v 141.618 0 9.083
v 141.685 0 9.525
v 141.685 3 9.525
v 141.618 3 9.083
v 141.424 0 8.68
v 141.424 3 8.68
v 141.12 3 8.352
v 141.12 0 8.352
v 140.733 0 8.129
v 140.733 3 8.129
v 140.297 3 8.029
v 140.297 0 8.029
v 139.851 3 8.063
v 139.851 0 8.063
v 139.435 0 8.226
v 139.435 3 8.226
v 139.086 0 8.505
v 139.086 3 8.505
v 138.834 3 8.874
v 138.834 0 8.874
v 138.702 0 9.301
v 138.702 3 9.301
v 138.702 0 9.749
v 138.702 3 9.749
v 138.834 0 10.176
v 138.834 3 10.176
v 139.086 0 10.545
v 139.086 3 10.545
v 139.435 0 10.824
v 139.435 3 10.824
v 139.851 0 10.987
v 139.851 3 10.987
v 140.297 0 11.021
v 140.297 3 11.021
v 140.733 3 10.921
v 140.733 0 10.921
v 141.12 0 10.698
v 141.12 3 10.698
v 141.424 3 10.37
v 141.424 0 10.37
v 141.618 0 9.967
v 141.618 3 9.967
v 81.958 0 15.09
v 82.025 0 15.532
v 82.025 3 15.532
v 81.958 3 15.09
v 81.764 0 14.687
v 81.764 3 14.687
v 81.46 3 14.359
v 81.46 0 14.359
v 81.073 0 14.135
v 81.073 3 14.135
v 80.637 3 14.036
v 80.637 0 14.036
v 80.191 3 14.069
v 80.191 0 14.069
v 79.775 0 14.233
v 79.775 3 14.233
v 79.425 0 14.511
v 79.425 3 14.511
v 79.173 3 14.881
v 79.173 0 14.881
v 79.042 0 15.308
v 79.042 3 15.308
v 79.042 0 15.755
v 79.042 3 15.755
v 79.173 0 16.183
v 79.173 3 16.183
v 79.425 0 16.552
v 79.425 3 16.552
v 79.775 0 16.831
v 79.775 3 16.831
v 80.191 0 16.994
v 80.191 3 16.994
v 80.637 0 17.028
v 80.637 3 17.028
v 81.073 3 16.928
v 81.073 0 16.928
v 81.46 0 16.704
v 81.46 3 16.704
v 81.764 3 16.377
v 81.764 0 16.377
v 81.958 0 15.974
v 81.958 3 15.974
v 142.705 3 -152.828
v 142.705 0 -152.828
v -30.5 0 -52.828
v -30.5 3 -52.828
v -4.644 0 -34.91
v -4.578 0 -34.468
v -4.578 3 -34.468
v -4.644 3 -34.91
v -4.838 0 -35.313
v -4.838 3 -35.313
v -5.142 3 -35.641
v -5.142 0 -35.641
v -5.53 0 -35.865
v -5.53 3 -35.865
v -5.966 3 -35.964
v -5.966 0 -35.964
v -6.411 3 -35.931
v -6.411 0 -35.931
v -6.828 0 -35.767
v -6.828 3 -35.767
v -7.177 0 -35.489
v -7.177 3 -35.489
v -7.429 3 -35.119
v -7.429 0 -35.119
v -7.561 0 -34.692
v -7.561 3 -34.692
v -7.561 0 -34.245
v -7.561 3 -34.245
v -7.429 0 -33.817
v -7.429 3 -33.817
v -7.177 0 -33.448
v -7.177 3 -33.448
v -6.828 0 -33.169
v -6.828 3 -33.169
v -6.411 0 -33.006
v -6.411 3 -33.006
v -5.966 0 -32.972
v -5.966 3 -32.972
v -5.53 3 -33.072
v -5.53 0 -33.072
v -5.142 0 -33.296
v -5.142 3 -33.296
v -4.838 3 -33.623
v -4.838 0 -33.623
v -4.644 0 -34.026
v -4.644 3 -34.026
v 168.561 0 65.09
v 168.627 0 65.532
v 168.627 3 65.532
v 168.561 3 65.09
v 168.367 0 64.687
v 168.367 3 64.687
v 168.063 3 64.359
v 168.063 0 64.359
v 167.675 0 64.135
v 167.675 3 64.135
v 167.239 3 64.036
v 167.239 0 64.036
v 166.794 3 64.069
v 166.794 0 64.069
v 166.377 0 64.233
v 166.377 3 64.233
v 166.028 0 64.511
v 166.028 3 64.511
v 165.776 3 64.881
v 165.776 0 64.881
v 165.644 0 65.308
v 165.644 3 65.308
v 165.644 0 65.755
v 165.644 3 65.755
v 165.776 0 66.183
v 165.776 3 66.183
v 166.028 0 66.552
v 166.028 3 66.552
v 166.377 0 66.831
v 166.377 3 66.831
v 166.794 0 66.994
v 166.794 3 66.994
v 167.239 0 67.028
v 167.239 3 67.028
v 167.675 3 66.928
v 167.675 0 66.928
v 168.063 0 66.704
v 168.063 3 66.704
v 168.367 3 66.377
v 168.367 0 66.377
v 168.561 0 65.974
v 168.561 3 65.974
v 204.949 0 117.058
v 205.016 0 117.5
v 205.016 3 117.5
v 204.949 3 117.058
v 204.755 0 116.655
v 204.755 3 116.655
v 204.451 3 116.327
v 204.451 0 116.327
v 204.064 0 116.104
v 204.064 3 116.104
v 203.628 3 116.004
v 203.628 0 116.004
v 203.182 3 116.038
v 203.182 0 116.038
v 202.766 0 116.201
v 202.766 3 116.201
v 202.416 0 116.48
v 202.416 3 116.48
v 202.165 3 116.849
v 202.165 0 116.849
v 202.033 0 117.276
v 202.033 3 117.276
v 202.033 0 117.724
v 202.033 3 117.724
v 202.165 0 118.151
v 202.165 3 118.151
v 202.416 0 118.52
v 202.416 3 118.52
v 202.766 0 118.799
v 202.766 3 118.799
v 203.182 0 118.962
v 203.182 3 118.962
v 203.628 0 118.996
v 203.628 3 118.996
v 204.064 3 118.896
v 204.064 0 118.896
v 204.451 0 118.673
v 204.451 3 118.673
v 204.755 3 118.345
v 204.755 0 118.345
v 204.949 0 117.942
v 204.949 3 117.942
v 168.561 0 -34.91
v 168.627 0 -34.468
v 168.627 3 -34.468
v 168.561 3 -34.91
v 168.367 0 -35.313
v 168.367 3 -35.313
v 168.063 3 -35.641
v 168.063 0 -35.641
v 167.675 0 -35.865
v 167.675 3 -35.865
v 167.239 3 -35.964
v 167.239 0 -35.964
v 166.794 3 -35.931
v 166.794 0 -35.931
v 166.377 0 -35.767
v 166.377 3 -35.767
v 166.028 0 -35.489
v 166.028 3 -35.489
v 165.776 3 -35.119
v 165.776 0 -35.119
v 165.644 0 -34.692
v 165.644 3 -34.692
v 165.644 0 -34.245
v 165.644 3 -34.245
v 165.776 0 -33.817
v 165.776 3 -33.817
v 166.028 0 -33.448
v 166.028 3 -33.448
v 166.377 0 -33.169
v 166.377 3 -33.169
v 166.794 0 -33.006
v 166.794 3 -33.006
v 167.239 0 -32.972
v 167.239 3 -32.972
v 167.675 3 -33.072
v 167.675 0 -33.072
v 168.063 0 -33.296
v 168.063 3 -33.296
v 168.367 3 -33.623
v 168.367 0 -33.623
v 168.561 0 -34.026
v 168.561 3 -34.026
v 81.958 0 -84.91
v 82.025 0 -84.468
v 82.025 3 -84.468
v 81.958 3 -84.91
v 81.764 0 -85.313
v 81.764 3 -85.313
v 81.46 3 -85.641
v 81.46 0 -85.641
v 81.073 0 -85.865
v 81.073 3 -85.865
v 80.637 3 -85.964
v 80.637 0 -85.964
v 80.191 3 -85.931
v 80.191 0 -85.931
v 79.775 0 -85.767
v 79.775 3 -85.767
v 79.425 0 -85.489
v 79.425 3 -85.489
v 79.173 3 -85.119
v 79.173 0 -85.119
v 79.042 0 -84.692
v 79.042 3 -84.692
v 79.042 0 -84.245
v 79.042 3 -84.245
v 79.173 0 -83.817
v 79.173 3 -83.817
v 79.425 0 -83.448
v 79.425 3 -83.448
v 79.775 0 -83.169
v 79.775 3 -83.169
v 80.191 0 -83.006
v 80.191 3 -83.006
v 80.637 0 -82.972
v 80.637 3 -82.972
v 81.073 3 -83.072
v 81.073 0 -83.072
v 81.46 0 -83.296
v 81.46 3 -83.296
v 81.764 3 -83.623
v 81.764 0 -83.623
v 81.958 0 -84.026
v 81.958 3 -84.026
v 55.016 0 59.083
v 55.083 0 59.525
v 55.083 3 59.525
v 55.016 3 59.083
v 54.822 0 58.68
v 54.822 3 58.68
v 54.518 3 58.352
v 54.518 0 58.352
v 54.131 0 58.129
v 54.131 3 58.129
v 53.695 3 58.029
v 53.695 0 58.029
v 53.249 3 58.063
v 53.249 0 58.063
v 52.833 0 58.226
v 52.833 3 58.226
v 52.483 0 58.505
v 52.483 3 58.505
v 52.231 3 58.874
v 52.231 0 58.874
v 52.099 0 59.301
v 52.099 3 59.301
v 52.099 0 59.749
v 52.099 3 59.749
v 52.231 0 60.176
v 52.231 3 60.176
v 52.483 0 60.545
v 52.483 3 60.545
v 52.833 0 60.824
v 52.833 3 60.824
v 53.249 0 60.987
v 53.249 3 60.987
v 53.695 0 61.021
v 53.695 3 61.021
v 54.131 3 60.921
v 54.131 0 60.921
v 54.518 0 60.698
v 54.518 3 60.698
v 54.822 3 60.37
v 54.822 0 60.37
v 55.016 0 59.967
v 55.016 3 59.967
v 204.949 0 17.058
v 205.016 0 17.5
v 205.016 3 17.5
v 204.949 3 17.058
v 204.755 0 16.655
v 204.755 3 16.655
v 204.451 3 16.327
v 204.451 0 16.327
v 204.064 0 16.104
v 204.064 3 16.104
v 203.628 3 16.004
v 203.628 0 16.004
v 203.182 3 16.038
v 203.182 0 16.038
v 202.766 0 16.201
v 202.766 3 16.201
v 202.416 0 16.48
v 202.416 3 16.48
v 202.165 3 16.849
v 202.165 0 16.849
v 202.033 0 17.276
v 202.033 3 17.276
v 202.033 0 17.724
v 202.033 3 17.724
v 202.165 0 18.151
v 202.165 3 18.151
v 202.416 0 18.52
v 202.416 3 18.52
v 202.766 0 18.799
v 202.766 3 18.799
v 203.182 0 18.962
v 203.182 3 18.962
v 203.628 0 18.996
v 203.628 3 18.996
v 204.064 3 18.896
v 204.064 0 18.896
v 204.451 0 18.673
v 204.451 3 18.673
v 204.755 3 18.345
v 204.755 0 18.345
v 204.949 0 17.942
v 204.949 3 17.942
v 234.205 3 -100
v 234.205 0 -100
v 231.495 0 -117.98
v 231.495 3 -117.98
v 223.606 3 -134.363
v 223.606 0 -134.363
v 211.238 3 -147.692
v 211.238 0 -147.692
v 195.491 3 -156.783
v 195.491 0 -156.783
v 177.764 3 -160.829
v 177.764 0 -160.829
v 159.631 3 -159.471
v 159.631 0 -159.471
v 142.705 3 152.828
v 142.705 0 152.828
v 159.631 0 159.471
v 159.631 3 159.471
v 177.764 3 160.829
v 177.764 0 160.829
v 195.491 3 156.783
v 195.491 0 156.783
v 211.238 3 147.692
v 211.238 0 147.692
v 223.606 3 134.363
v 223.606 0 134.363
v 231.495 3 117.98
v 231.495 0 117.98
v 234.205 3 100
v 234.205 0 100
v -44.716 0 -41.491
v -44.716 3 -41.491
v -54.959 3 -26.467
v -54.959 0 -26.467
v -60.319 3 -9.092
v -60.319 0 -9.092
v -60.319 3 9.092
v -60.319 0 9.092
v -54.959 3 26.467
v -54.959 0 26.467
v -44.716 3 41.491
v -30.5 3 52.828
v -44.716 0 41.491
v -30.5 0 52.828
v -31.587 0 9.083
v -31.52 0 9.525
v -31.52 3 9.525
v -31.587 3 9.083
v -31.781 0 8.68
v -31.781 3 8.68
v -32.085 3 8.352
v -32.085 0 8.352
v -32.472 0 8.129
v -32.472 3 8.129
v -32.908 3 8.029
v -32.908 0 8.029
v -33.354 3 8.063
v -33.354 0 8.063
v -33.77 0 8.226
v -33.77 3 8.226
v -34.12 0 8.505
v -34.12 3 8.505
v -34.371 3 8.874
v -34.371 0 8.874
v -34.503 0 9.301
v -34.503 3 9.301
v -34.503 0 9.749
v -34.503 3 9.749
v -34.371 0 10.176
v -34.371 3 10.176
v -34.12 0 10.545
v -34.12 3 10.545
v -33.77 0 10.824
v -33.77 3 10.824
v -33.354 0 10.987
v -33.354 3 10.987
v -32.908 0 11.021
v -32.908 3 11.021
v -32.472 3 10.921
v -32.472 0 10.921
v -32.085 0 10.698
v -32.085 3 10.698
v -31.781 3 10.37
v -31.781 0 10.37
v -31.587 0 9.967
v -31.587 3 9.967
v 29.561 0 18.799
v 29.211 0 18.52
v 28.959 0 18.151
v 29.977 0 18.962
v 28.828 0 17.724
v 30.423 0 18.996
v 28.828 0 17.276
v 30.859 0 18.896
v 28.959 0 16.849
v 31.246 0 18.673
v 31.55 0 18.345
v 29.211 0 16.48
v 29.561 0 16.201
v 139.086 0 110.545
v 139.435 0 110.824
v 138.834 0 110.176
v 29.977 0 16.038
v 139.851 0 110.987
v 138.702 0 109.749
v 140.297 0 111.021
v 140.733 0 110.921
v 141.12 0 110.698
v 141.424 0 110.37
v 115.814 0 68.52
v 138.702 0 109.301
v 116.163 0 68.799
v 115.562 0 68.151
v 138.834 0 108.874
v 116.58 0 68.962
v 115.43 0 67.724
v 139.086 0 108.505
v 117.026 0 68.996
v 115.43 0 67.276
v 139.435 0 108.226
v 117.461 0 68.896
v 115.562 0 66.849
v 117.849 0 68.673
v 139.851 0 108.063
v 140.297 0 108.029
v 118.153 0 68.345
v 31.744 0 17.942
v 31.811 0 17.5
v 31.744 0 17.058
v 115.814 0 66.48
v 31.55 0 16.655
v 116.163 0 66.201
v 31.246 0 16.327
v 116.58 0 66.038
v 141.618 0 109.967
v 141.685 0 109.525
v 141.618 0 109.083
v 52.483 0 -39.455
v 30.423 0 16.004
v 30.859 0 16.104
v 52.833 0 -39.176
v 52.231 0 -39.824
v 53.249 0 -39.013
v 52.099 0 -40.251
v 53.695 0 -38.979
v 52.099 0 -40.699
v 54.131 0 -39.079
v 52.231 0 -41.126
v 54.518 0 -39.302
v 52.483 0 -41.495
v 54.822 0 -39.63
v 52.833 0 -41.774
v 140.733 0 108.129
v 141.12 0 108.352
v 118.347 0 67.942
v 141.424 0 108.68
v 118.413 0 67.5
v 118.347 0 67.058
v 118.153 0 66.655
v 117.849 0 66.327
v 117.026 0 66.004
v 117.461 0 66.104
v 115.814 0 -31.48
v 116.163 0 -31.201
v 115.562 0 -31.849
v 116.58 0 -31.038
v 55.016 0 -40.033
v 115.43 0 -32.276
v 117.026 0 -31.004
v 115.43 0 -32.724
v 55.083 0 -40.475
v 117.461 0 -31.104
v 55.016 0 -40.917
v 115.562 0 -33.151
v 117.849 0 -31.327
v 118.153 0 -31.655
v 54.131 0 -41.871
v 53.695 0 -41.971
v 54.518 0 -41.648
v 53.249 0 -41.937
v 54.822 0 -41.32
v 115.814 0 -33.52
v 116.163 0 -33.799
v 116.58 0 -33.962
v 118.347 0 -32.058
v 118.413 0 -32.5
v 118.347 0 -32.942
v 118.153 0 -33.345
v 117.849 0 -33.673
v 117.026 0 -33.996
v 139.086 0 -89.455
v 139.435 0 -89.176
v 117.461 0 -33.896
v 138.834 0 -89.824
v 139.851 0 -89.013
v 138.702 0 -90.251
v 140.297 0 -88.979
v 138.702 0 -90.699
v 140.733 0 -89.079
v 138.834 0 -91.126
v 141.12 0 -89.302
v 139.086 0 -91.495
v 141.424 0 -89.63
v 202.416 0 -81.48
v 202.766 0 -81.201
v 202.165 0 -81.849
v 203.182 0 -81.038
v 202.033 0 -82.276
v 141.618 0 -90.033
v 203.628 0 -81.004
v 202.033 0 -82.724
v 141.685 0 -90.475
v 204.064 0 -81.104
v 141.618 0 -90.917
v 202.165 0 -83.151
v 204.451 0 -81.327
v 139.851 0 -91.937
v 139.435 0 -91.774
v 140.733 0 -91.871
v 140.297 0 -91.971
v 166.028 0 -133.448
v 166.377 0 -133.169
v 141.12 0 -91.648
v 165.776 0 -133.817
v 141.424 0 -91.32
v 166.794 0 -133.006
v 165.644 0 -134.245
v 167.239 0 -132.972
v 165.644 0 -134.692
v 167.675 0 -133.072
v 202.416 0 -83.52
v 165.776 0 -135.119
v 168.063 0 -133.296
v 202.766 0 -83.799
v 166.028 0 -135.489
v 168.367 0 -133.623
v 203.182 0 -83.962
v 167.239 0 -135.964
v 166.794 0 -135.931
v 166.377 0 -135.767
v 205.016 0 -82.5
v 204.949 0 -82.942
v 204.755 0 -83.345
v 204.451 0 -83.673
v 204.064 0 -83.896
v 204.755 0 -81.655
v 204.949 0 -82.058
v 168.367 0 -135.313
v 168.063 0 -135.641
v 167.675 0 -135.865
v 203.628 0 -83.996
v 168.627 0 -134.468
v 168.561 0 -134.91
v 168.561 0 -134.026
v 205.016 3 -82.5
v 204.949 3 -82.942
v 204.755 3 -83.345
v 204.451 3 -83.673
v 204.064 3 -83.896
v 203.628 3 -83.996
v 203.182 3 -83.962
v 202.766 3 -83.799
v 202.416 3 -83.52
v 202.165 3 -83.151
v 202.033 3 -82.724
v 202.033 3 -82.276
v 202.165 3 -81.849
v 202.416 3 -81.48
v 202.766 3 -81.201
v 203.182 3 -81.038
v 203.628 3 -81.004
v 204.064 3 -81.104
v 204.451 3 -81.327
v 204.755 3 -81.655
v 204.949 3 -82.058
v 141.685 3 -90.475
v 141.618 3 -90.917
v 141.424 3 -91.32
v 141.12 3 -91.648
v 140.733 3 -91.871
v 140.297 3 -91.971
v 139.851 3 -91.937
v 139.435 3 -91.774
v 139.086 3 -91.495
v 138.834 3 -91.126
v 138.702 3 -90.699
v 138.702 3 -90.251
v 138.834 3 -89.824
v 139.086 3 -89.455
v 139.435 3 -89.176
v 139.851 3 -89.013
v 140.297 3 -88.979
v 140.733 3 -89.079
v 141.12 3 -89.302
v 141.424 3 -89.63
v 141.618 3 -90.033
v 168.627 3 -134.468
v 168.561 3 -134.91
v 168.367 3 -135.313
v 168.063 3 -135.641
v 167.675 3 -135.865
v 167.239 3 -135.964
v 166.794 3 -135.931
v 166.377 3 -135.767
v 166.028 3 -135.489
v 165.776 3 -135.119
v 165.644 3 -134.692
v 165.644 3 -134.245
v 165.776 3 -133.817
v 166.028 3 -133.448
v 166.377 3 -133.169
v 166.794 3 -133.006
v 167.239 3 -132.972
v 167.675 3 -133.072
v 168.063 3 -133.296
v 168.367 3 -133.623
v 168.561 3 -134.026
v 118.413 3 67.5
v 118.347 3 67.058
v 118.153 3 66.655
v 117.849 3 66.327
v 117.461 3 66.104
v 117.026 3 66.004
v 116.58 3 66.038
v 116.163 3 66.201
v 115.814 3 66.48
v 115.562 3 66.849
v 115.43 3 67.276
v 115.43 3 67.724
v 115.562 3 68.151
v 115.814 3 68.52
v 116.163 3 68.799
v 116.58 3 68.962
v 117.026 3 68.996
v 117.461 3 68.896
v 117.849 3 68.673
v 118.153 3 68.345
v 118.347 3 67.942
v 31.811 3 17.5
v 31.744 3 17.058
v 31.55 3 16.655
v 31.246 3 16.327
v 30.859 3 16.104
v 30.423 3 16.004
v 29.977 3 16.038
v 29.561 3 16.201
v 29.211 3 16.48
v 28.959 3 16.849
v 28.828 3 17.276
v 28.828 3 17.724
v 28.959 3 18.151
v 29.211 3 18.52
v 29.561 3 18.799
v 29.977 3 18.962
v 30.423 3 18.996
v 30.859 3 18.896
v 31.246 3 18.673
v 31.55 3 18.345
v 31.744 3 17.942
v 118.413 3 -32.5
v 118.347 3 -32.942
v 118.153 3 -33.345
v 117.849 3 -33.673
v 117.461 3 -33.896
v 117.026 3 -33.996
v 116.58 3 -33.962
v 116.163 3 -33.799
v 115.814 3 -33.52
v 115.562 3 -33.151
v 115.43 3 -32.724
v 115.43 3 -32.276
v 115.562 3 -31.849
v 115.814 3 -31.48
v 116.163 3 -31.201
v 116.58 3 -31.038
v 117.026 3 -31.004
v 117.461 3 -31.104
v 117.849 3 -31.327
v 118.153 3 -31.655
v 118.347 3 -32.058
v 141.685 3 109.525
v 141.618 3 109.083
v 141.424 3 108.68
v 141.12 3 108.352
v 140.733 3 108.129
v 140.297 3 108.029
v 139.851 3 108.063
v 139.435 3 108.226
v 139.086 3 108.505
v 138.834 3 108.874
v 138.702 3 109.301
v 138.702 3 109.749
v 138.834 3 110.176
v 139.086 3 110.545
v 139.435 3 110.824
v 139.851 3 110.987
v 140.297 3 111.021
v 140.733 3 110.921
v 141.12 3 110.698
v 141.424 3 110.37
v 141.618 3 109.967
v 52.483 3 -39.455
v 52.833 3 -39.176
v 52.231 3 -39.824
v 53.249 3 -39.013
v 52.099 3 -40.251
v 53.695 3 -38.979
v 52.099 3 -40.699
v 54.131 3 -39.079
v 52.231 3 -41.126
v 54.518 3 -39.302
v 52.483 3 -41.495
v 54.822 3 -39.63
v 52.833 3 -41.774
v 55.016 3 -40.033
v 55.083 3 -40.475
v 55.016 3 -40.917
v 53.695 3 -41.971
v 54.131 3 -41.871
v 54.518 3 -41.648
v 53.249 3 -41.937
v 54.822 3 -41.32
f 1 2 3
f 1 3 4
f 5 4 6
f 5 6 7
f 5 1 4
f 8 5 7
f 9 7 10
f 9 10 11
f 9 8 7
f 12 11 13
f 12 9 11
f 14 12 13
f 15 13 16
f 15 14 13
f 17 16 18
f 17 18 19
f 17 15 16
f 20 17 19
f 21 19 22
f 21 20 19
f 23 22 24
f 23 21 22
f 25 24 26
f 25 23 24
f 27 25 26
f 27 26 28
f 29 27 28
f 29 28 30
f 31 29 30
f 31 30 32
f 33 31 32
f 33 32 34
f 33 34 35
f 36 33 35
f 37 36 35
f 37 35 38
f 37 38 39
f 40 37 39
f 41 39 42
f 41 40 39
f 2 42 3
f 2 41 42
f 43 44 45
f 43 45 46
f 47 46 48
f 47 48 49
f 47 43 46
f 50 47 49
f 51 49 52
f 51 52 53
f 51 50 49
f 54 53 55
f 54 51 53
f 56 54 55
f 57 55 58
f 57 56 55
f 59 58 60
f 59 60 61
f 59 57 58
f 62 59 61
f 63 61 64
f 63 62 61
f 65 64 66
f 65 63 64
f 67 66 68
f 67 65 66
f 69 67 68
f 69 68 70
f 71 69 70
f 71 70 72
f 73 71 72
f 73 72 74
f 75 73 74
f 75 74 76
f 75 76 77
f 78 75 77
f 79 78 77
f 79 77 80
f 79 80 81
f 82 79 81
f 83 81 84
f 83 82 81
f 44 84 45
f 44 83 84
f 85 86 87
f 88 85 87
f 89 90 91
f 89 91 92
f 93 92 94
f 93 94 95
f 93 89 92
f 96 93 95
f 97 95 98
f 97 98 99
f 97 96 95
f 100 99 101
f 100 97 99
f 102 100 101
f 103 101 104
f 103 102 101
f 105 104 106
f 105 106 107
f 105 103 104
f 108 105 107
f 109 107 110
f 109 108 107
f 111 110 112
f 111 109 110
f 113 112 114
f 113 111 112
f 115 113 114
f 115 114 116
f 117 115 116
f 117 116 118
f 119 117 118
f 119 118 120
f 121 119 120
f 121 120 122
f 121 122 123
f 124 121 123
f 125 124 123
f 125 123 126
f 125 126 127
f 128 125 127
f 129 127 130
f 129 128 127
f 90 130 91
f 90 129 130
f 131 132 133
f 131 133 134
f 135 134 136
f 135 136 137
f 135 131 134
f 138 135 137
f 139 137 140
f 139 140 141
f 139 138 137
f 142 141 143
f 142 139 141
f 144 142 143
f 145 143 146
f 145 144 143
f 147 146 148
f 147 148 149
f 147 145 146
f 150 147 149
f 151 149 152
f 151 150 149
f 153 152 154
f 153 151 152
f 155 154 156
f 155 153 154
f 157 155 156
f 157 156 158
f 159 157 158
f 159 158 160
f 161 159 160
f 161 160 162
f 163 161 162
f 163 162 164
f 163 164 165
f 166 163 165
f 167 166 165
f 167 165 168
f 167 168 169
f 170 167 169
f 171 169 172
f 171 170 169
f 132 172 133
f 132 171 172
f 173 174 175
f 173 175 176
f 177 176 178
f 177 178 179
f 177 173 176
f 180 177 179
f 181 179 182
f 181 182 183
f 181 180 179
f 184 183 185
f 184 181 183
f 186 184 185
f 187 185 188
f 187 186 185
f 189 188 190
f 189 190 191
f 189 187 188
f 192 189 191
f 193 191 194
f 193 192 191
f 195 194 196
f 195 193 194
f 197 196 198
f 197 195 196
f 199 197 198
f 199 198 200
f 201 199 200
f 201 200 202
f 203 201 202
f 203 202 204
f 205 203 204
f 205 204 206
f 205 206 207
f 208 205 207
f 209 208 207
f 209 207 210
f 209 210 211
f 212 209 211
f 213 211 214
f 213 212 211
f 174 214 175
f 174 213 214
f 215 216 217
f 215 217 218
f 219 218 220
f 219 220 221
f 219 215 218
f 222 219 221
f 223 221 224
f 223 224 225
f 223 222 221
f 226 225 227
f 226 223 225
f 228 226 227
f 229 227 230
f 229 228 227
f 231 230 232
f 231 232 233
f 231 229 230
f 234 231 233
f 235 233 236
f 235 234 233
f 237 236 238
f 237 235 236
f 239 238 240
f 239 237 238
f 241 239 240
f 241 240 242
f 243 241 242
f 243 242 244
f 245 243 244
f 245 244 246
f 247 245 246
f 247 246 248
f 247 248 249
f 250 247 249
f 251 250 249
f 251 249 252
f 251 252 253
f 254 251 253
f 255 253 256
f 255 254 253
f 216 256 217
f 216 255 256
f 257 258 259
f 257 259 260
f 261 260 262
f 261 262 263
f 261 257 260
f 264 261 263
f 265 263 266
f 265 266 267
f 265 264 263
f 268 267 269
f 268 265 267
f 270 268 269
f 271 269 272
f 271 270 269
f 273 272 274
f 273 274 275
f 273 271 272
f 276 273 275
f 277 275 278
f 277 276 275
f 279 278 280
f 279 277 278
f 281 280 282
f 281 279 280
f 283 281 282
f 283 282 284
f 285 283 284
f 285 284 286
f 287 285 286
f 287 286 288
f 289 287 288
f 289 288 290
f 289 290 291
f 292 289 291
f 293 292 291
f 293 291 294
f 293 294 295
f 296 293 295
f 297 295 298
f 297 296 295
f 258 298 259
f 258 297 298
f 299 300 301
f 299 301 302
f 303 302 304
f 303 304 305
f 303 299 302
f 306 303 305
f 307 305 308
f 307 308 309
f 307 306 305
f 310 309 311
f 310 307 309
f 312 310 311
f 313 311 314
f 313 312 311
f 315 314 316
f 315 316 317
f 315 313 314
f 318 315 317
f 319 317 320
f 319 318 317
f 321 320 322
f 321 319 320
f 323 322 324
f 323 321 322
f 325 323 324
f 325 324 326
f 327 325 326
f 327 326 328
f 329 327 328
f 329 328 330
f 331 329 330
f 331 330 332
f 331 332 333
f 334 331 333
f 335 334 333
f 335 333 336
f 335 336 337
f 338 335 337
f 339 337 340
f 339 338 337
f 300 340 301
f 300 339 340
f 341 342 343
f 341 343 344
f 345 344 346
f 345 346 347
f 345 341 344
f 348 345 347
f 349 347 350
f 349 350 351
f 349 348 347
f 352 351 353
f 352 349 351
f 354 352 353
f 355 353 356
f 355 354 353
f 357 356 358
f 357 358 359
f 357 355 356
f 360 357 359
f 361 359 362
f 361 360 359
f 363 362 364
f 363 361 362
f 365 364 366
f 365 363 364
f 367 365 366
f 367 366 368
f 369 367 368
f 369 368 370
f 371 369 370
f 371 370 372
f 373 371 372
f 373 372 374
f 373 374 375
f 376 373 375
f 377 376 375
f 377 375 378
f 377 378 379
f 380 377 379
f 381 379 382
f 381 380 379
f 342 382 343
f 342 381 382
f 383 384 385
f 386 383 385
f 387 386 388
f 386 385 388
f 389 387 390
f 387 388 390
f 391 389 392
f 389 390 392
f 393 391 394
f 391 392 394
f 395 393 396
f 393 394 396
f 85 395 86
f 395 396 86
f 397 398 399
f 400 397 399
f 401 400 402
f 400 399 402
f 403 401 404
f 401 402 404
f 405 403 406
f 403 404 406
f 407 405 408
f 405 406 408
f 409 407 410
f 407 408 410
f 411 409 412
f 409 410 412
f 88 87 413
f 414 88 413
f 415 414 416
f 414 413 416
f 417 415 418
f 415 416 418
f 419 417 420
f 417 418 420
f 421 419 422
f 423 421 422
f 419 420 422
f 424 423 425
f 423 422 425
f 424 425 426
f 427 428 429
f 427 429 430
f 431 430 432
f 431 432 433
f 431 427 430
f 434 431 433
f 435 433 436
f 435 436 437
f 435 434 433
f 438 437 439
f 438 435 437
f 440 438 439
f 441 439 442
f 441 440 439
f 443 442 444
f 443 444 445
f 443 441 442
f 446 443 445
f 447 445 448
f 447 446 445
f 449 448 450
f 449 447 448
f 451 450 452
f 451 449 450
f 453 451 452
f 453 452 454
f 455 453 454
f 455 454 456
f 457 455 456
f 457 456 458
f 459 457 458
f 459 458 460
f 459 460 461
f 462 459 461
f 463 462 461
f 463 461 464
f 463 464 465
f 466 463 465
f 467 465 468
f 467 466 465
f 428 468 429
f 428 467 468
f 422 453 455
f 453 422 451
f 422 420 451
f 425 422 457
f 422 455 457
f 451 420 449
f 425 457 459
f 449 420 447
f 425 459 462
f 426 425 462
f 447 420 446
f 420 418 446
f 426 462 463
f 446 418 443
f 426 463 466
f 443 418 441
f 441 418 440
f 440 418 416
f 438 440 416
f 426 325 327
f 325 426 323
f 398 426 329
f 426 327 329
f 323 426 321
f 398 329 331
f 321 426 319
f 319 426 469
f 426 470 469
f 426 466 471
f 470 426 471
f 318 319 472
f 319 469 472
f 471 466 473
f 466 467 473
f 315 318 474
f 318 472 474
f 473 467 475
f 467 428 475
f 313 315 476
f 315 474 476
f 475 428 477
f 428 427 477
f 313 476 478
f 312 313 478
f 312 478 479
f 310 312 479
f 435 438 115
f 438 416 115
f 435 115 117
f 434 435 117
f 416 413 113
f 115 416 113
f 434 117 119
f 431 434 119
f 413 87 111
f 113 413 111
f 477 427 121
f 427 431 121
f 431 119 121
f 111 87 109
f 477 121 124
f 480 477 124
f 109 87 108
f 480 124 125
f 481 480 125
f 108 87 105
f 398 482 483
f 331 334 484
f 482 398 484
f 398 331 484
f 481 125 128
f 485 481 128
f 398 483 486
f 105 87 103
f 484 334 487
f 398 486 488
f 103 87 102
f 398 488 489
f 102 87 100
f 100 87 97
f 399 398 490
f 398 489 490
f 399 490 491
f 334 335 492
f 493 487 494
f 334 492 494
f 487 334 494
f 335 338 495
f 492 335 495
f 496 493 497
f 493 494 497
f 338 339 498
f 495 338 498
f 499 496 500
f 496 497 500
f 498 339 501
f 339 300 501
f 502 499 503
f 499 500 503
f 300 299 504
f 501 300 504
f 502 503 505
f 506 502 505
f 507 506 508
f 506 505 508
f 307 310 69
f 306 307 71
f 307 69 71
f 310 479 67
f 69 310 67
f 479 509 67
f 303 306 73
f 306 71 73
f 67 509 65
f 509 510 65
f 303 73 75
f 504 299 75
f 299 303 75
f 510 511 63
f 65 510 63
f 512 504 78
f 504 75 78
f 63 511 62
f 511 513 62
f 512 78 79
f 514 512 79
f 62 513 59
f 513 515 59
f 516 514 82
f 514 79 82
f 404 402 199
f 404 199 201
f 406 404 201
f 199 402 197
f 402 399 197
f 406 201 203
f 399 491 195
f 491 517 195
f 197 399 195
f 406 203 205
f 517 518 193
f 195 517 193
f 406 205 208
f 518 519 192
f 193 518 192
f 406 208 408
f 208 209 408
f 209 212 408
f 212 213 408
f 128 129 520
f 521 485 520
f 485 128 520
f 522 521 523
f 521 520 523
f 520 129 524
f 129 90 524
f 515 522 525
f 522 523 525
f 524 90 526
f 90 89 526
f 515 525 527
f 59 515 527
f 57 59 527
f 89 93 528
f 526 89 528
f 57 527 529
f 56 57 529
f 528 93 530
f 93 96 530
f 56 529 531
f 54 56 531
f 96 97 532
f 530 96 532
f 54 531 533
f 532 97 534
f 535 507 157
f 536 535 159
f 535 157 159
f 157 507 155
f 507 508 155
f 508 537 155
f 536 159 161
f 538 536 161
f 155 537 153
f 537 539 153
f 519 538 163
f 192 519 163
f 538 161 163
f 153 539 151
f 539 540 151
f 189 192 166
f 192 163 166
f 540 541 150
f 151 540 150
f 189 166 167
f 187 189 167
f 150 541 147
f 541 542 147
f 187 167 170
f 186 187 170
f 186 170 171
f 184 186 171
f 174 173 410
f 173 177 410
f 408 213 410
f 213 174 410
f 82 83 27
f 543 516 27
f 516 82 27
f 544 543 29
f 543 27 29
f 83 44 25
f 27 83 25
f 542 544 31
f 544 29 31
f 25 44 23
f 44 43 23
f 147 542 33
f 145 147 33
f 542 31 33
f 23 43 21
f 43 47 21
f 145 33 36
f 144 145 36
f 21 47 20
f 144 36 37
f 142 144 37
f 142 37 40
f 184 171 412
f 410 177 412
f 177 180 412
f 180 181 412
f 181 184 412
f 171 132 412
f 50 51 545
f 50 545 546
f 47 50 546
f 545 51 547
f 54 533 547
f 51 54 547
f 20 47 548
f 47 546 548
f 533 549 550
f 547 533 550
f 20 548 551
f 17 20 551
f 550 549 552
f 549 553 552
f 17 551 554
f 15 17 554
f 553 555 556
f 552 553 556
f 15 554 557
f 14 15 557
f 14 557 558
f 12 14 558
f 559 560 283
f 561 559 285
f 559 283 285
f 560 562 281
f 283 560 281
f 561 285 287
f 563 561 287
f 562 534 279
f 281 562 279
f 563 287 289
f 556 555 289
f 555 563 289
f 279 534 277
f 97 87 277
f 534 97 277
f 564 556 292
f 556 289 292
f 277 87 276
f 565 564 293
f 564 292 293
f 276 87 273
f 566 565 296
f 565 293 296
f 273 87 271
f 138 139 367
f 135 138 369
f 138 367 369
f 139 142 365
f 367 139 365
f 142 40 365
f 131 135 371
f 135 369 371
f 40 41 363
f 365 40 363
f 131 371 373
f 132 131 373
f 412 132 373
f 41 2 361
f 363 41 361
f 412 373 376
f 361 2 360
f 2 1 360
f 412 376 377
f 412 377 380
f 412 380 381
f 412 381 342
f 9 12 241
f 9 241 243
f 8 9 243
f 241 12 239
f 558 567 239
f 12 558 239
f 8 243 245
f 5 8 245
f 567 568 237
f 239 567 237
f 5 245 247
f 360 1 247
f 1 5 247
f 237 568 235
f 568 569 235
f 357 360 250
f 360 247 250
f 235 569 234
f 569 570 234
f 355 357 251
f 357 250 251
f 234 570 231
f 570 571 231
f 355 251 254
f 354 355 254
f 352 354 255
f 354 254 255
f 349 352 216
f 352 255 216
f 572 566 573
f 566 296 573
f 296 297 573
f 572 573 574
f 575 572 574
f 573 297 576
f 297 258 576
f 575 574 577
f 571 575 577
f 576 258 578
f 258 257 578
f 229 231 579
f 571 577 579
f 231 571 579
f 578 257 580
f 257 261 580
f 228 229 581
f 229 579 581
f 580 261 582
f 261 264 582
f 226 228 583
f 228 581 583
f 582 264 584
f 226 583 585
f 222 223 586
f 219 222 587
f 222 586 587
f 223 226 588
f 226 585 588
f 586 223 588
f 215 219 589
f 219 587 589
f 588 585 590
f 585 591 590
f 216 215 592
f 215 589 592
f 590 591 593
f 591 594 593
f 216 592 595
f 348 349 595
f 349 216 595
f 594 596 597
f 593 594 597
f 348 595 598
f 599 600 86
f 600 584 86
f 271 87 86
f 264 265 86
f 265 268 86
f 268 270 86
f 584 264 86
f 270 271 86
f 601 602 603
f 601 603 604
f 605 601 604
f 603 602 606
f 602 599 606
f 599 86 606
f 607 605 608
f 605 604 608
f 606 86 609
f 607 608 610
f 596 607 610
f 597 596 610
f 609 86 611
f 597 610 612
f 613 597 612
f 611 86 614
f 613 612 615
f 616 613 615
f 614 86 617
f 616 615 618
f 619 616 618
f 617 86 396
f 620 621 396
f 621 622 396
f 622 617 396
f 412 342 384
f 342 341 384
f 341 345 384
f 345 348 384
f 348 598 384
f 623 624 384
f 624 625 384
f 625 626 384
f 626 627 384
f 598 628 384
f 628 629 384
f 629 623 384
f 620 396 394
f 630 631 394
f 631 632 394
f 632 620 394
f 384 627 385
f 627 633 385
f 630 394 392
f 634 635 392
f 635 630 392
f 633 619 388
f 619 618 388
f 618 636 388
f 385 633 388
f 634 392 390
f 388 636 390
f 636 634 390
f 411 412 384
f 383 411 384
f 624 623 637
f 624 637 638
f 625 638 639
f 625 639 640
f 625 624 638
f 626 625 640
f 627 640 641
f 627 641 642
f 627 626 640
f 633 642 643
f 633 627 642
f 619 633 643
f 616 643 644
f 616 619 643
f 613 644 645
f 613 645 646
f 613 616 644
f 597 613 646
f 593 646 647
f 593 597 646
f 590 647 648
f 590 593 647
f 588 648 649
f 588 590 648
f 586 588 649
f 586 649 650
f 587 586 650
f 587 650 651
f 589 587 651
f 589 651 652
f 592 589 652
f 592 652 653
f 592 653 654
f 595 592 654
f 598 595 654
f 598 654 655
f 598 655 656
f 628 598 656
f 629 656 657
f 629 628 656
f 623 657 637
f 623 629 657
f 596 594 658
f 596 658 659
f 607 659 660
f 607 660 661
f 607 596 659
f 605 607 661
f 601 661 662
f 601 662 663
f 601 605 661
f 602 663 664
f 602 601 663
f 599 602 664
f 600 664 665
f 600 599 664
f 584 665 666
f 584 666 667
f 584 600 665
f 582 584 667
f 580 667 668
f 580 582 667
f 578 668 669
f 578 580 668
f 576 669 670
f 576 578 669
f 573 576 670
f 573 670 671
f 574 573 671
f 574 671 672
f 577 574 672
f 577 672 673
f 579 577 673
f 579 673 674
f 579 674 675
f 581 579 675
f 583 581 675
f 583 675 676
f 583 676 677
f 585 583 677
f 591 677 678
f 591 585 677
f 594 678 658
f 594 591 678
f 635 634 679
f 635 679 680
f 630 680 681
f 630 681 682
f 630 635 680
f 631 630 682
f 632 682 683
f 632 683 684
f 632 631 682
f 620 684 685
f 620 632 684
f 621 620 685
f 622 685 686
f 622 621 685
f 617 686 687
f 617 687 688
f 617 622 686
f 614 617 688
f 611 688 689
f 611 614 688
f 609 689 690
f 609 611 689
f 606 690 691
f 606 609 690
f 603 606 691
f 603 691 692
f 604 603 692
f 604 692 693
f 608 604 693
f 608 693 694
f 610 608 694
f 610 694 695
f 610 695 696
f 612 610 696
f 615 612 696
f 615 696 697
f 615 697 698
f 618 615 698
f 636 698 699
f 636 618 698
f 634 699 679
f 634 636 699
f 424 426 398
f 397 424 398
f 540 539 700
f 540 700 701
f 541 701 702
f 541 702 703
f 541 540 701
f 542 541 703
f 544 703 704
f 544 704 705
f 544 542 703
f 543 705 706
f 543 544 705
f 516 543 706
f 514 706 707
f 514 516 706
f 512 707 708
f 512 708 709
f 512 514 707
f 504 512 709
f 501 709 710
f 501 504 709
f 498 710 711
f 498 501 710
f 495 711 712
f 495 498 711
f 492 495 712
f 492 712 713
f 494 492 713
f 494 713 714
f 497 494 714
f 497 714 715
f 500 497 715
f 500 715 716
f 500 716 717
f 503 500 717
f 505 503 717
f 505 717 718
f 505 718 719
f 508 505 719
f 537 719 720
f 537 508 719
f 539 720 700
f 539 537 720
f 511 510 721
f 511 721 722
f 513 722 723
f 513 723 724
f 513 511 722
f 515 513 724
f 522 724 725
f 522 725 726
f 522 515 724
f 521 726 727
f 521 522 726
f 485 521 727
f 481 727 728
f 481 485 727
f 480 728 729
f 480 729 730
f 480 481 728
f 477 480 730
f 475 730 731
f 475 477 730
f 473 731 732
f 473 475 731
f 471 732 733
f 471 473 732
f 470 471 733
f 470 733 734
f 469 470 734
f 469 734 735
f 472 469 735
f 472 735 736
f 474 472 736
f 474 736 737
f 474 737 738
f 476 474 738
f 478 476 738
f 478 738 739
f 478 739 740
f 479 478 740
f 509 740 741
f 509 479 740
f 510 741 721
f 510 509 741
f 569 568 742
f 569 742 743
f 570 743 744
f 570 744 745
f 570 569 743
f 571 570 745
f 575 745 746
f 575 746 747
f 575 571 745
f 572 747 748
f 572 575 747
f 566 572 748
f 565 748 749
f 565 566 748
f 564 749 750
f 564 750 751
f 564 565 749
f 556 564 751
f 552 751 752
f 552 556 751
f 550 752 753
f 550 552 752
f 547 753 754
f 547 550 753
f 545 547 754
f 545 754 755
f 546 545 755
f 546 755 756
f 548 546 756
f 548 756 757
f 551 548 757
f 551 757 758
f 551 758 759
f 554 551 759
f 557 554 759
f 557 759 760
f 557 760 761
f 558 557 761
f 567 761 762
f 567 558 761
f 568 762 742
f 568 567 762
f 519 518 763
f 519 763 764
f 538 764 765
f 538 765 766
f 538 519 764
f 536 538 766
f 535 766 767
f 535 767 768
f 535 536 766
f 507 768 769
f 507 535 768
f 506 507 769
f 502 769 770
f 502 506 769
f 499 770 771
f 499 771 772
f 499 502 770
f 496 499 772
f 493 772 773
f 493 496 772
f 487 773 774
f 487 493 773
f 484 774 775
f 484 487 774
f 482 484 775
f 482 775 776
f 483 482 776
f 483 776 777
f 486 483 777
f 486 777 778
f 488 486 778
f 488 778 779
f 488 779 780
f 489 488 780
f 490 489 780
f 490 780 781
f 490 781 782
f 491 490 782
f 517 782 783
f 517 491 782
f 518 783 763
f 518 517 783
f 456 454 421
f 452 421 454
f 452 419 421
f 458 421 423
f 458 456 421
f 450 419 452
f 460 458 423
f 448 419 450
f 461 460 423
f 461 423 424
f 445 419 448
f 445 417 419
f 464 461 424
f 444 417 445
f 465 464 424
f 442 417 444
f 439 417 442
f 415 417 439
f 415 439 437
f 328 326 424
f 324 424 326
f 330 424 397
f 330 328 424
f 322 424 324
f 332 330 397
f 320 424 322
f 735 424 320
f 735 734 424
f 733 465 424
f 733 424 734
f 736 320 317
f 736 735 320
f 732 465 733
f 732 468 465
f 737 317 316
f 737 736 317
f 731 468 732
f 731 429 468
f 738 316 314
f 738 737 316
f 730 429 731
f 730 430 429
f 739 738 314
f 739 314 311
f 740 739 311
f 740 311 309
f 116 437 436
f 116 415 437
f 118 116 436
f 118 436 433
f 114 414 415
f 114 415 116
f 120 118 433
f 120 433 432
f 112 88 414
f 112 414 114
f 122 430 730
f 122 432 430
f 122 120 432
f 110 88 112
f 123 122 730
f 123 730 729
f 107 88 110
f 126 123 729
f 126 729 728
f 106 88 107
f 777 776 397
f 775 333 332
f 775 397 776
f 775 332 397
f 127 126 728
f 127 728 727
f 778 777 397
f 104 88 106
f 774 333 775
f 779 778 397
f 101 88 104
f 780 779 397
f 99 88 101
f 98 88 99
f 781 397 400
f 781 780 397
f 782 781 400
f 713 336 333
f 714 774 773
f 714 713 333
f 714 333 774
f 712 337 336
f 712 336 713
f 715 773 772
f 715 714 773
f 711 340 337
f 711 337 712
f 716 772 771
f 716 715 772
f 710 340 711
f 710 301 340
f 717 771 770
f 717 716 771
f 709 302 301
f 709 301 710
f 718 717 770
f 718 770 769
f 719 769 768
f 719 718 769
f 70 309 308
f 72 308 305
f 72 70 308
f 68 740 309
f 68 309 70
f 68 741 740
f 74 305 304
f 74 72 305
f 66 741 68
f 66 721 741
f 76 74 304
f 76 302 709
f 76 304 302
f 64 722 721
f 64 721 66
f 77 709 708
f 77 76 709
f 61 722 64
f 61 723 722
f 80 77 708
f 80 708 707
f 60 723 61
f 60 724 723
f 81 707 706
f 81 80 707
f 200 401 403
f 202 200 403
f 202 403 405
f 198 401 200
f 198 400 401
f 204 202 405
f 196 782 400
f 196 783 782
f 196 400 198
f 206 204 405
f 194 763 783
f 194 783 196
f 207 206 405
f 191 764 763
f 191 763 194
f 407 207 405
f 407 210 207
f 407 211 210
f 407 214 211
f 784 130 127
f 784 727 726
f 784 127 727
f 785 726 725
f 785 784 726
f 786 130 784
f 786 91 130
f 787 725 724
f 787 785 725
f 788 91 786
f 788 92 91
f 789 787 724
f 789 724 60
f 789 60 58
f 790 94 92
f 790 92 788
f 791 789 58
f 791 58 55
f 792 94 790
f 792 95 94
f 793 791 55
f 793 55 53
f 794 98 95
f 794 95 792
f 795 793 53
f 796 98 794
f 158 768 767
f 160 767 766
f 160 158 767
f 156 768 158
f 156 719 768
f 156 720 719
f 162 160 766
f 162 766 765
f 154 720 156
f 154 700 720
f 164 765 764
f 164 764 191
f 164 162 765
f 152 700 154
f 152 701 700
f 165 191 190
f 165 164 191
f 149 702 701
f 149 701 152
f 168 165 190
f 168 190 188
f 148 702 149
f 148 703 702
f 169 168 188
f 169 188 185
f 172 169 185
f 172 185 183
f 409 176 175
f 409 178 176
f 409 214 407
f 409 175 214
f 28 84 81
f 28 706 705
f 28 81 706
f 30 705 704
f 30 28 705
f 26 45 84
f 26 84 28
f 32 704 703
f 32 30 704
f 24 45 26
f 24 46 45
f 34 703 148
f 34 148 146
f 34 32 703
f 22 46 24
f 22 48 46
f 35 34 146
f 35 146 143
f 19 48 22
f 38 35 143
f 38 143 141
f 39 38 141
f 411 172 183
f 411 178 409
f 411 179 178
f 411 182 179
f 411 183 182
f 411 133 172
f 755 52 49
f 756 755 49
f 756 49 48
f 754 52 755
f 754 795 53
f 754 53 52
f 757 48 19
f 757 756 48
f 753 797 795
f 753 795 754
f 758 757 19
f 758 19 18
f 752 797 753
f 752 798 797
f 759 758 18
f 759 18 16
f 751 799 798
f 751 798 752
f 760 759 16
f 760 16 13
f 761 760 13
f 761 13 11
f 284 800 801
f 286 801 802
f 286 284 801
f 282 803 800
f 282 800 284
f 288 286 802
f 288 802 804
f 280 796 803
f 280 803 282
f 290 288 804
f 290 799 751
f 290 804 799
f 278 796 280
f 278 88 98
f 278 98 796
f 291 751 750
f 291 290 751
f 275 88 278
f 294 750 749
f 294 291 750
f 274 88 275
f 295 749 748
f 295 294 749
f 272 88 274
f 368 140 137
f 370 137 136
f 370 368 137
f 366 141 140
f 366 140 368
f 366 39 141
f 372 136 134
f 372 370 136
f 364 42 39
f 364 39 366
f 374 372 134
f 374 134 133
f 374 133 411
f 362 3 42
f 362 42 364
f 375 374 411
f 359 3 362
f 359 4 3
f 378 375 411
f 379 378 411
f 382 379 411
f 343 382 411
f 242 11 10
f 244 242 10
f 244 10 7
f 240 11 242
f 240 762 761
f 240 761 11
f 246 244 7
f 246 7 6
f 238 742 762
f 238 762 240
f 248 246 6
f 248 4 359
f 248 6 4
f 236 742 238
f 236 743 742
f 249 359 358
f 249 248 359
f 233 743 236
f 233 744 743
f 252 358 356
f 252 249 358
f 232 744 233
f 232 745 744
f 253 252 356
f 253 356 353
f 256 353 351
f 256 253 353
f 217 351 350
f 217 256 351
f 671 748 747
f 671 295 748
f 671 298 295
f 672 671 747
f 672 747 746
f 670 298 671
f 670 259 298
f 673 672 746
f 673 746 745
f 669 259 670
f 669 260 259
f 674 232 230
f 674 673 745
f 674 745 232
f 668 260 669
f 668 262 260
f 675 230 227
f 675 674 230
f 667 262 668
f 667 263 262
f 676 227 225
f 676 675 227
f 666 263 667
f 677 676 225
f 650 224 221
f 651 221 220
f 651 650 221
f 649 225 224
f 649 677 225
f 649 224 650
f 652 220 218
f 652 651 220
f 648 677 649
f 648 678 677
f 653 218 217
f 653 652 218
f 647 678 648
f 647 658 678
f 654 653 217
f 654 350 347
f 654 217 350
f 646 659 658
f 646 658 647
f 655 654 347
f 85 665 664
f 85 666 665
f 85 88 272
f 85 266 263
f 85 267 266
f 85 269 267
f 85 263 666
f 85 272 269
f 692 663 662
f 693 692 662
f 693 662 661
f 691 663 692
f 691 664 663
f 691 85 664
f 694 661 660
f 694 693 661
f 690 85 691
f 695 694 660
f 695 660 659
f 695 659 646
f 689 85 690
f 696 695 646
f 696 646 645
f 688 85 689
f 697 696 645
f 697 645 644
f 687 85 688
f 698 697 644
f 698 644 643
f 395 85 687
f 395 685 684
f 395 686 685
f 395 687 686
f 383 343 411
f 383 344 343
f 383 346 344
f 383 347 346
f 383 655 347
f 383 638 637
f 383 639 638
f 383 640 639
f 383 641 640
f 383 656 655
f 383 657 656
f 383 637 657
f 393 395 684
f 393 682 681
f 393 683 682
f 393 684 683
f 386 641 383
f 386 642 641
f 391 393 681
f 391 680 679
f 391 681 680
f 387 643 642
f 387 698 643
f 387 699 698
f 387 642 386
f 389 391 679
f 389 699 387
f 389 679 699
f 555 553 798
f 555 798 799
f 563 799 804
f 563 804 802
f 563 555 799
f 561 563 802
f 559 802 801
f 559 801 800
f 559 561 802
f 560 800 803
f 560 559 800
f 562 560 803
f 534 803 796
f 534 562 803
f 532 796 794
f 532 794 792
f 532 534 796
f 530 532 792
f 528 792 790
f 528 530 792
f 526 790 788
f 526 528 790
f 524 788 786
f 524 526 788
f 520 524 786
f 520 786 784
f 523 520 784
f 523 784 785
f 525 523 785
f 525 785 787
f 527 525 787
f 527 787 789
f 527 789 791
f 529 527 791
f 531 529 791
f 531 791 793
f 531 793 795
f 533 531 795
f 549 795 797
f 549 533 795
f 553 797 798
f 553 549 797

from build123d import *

# Parameters (mm, degrees)
SKETCH1_R           = 1.5
BOSS_EXTRUDE1_DEPTH = 3


with BuildPart() as part:
    # Sketch1 → Boss-Extrude1 (new body)
    with BuildSketch(Plane(origin=(0, 0, 0), x_dir=(1, 0, 0), z_dir=(0, 1, 0))):
        with BuildLine():
            Line((234.205080757, -100), (234.205080757, 100))
            ThreePointArc((234.205080757, 100), (203.705080757, 152.827549631), (142.705080757, 152.827549631))
            Line((142.705080757, 152.827549631), (-30.5, 52.827549631))
            ThreePointArc((-30.5, 52.827549631), (-61, 0), (-30.5, -52.827549631))
            Line((-30.5, -52.827549631), (142.705080757, -152.827549631))
            ThreePointArc((142.705080757, -152.827549631), (203.705080757, -152.827549631), (234.205080757, -100))
        make_face()
        with Locations((53.582540378, -59.525)):
            Circle(SKETCH1_R, mode=Mode.SUBTRACT)
        with Locations((80.524854378, -15.531728)):
            Circle(SKETCH1_R, mode=Mode.SUBTRACT)
        with Locations((116.913429378, -67.500001)):
            Circle(SKETCH1_R, mode=Mode.SUBTRACT)
        with Locations((53.582540378, 40.475)):
            Circle(SKETCH1_R, mode=Mode.SUBTRACT)
        with Locations((80.524854378, 84.468272)):
            Circle(SKETCH1_R, mode=Mode.SUBTRACT)
        with Locations((116.913429378, 32.499999)):
            Circle(SKETCH1_R, mode=Mode.SUBTRACT)
        with Locations((203.515969757, -17.500001)):
            Circle(SKETCH1_R, mode=Mode.SUBTRACT)
        with Locations((140.185080757, -9.525)):
            Circle(SKETCH1_R, mode=Mode.SUBTRACT)
        with Locations((167.127394757, 34.468272)):
            Circle(SKETCH1_R, mode=Mode.SUBTRACT)
        with Locations((-6.077686, 34.468272)):
            Circle(SKETCH1_R, mode=Mode.SUBTRACT)
        with Locations((-33.02, -9.525)):
            Circle(SKETCH1_R, mode=Mode.SUBTRACT)
        with Locations((30.310889, -17.500001)):
            Circle(SKETCH1_R, mode=Mode.SUBTRACT)
        with Locations((167.127394757, 134.468272)):
            Circle(SKETCH1_R, mode=Mode.SUBTRACT)
        with Locations((140.185080757, 90.475)):
            Circle(SKETCH1_R, mode=Mode.SUBTRACT)
        with Locations((203.515969757, 82.499999)):
            Circle(SKETCH1_R, mode=Mode.SUBTRACT)
        with Locations((167.127394757, -65.531728)):
            Circle(SKETCH1_R, mode=Mode.SUBTRACT)
        with Locations((140.185080757, -109.525)):
            Circle(SKETCH1_R, mode=Mode.SUBTRACT)
        with Locations((203.515969757, -117.500001)):
            Circle(SKETCH1_R, mode=Mode.SUBTRACT)
    extrude(amount=BOSS_EXTRUDE1_DEPTH)


solid = part.part
